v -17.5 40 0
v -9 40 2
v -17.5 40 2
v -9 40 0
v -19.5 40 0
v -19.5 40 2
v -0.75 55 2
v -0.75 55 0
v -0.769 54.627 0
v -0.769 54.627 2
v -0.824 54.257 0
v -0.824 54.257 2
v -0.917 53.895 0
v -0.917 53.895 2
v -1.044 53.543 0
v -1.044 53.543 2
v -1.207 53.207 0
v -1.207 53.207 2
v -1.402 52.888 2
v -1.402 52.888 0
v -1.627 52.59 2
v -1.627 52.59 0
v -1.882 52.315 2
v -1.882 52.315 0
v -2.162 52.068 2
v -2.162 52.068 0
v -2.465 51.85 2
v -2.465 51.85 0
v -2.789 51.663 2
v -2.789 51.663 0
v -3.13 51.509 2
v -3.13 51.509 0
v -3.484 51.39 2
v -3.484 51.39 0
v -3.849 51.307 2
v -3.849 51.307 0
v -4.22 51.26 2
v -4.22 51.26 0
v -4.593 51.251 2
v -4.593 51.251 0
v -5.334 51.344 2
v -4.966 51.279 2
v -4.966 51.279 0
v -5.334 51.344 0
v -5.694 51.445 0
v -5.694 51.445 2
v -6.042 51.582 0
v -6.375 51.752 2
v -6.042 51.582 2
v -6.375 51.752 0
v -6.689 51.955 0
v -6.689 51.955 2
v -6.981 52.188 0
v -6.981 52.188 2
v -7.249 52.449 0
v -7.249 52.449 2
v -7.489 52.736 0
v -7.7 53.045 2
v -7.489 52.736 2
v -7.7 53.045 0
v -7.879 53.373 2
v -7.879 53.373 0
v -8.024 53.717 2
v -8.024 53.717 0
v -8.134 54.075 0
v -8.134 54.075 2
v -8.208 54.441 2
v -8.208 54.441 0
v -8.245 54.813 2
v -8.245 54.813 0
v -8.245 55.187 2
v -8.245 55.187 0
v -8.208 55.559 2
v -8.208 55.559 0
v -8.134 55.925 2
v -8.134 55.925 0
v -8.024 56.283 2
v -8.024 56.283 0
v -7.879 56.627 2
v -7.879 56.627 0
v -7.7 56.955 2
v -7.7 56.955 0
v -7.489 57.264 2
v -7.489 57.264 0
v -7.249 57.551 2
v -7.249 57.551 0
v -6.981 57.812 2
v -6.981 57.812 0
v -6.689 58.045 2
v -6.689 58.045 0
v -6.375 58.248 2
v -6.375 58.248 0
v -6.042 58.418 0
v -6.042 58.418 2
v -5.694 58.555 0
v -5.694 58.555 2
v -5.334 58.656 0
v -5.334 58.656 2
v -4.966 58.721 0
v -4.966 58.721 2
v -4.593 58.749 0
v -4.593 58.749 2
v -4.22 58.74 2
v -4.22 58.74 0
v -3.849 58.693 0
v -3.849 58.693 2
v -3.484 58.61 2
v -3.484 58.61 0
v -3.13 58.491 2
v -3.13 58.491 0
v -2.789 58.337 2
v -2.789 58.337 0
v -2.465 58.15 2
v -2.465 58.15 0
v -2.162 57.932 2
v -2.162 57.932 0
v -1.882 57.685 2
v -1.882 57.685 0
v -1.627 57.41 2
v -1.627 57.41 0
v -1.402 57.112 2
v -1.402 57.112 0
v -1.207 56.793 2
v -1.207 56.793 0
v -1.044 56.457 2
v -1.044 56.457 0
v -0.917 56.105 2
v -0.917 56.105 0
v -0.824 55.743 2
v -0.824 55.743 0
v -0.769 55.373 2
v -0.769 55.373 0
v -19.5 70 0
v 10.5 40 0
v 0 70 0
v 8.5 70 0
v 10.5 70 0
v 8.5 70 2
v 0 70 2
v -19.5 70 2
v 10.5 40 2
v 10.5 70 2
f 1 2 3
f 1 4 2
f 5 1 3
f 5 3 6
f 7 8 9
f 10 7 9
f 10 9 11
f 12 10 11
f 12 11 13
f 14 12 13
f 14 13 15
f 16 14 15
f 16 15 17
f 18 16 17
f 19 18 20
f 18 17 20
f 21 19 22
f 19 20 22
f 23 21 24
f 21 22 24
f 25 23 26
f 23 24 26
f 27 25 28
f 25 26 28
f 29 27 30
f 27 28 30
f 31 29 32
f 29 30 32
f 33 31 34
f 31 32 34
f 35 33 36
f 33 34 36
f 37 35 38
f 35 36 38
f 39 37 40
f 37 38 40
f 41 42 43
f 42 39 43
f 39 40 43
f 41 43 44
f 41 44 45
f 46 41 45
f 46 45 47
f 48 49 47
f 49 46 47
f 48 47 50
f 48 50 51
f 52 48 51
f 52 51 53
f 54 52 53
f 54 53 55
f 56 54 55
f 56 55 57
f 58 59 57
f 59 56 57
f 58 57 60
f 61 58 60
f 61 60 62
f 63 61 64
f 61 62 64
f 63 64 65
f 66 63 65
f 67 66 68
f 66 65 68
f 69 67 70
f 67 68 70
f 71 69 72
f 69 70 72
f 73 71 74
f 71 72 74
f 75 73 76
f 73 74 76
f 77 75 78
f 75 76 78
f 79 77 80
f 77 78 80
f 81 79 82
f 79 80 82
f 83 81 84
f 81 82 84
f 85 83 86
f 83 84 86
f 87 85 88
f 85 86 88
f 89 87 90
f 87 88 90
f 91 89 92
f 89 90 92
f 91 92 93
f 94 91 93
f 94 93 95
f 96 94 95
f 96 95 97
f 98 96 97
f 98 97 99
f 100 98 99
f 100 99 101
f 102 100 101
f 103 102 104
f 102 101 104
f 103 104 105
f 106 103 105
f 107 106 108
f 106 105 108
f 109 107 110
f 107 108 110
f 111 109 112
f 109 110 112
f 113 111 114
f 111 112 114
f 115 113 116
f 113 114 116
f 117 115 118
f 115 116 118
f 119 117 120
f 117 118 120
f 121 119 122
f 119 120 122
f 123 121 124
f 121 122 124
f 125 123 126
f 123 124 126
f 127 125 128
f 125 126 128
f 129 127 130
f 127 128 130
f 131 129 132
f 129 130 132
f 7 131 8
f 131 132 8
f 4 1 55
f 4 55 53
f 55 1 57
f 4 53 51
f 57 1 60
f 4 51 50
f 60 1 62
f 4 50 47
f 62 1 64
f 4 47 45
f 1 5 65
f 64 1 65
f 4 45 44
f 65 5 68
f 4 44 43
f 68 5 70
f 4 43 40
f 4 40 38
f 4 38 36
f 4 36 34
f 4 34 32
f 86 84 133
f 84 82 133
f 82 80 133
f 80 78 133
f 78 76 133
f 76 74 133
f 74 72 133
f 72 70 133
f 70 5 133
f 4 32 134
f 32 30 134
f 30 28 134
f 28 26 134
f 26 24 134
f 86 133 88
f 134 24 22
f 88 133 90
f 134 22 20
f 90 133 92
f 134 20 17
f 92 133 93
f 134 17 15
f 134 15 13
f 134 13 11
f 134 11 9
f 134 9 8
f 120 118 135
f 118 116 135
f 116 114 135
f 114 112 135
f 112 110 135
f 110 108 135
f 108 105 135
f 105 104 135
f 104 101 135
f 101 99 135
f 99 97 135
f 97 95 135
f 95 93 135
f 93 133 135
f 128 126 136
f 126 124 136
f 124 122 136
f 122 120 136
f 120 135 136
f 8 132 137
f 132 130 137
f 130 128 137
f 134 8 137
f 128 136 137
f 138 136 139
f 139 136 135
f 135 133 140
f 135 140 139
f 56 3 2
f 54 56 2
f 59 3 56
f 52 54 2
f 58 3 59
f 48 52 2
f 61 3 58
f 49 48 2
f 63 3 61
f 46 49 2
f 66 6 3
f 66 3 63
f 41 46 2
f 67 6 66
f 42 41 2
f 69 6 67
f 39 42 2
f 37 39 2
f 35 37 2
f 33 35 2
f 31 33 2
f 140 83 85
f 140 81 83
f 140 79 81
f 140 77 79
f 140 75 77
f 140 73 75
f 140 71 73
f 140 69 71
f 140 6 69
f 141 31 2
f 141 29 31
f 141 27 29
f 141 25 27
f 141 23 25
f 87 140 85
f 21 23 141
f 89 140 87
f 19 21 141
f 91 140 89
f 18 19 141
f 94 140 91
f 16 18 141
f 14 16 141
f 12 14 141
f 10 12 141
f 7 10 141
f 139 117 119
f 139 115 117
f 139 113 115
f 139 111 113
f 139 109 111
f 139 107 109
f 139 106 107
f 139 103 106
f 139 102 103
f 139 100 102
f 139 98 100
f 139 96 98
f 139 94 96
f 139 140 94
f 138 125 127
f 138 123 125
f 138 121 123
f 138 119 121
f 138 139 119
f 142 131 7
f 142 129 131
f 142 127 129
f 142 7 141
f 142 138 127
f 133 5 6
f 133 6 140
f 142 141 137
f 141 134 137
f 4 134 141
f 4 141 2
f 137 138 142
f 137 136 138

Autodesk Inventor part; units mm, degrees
ref_plane "YZ Plane" through (0, 0, 0) normal (1, 0, 0) x (0, 1, 0)
ref_plane "XZ Plane" through (0, 0, 0) normal (0, 1, 0) x (-1, 0, 0)
ref_plane "XY Plane" through (0, 0, 0) normal (0, 0, 1) x (1, 0, 0)
sketch "Sketch1" plane through (0, 0, 0) normal (0, 0, 1) x (1, 0, 0)
  arc A0 (-5.9942, 51.8019) -> (-3.0058, 51.8019) centre (-4.5, 55) ccw
  line L0 (8.4999, 69.9999) -> (0, 69.9999)
  line L1 (-9, 40.0001) -> (-17.4999, 40.0001)
  line L2 (10.4999, 0) -> (10.4999, 69.9999)
  line L3 (-19.4999, 0) -> (-19.4999, 69.9999)
  line L4 (-19.4999, 69.9999) -> (10.4999, 69.9999)
  line L5 (10.4999, 69.9999) -> (10.4999, 40.0001)
  line L6 (10.4999, 40.0001) -> (-19.4999, 40.0001)
  line L7 (-19.4999, 40.0001) -> (-19.4999, 69.9999)
  circle A1 centre (-4.5, 55) radius 3.75
  point P0 (0, 0)
  dimension "d0" = 29.9999
  dimension "d1" = 29.9999
  dimension "d2" = 14.9999
  dimension "d3" = 7.5
extrude "Plate1" add sketch "Sketch1" along normal blind 2
equation "\"BendRadius\" = Thickness"
equation "\"BendReliefWidth\" = Thickness"
equation "\"BendReliefDepth\" = 0.5 * Thickness"
equation "\"CornerReliefSize\" = 4 * Thickness"
equation "\"MinimumRemnant\" = 2 * Thickness"
equation "\"TransitionRadius\" = BendRadius"
equation "\"JacobiRadiusSize\" = BendRadius"
equation "\"GapSize\" = Thickness"
equation "\"d4\" = BendRadius"
equation "\"Thickness\" = 2"
properties part number "gabarito-30" material "Wood (Oak)"
